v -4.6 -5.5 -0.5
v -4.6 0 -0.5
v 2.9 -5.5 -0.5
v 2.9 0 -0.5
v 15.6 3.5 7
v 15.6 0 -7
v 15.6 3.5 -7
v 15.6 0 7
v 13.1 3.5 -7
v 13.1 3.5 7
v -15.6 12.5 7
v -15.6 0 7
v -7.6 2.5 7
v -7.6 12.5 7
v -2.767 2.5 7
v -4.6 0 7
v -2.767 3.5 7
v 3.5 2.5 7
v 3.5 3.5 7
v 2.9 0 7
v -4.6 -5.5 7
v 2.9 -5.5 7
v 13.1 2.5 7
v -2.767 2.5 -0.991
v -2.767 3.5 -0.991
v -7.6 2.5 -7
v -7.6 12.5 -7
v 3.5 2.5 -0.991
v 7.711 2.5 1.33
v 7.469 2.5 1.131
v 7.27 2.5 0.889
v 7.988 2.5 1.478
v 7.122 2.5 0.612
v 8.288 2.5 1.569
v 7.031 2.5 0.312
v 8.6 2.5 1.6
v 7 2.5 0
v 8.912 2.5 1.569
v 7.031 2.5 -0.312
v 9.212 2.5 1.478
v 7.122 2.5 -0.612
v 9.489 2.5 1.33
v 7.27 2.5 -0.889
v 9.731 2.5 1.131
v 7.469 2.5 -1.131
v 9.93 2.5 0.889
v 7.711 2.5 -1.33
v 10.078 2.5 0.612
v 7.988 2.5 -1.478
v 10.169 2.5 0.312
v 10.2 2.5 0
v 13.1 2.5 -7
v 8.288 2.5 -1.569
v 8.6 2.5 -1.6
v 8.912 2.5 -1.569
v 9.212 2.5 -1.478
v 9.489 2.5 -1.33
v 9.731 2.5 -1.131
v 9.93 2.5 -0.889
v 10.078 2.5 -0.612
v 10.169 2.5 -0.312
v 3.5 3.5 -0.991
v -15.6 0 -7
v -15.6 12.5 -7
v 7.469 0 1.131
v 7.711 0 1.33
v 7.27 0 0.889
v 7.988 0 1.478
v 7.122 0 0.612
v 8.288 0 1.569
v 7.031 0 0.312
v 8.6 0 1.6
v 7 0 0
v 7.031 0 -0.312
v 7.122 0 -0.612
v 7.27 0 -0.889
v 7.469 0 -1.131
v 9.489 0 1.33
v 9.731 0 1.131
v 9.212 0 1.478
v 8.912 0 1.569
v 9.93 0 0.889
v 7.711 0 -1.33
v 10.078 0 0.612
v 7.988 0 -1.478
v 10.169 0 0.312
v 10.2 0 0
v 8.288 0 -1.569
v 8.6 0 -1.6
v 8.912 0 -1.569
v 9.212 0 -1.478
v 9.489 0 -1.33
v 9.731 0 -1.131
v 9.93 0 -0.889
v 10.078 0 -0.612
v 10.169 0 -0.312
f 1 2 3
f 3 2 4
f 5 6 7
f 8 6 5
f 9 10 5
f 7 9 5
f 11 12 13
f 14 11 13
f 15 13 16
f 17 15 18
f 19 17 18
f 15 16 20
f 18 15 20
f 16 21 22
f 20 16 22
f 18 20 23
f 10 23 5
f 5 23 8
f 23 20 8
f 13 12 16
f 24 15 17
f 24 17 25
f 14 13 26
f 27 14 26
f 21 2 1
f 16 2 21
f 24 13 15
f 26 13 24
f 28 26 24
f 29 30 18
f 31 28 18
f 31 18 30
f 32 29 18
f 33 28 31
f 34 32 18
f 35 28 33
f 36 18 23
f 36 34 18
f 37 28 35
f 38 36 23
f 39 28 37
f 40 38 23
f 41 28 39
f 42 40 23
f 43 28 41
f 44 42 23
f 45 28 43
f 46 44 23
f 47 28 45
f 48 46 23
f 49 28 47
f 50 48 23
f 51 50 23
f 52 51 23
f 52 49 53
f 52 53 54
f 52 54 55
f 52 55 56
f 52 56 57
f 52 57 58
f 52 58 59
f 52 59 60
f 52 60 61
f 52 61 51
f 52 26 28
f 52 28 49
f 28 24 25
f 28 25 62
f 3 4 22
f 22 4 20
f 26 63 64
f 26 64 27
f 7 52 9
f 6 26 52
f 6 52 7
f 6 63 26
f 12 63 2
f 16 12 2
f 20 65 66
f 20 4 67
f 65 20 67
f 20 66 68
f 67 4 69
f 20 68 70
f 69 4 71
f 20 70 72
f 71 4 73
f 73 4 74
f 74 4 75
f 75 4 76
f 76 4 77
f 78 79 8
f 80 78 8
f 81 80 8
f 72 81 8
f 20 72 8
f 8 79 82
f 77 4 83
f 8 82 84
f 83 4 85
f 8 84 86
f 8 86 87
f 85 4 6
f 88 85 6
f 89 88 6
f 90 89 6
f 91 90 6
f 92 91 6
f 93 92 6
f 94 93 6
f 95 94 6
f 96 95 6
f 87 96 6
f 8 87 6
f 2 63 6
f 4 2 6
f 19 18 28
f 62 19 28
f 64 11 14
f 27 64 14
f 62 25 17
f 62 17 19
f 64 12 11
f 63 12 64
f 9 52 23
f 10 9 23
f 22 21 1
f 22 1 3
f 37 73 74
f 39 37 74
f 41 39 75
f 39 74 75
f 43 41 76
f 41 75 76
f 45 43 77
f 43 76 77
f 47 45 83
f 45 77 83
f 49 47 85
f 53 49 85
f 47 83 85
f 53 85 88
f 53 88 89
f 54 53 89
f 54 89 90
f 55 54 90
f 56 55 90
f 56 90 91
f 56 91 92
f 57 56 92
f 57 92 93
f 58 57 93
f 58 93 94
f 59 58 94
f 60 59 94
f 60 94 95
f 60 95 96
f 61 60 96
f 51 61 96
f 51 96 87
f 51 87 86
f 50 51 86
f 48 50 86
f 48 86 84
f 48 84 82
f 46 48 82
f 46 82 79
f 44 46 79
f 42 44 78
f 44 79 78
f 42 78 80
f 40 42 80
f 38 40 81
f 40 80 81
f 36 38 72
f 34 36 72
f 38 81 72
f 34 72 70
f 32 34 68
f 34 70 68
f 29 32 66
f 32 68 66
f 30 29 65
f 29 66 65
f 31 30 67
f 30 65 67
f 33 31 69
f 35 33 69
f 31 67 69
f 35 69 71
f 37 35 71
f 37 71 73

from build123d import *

# Parameters (mm, degrees)
SKETCH_1_W         = 31.2
SKETCH_1_H         = 14
EXTRUDE_1_DEPTH    = 2.5
SKETCH_2_W         = 8
SKETCH_2_H         = 14
EXTRUDE_2_DEPTH    = 10
SKETCH_3_W         = 7.5
SKETCH_3_H         = 7.5
EXTRUDE_3_DEPTH    = 5.5
HOLE_WIZARD_M3_1_D = 3.2
SKETCH_9_W         = 6.266652583
SKETCH_9_H         = 7.99110138
EXTRUDE_7_DEPTH    = 1
SKETCH_10_W        = 2.5
SKETCH_10_H        = 14
EXTRUDE_8_DEPTH    = 1


with BuildPart() as part:
    # 草图1 → 凸台-拉伸1 (new body)
    with BuildSketch(Plane(origin=(0, 0, 0), x_dir=(1, 0, 0), z_dir=(0, 1, 0))):
        Rectangle(SKETCH_1_W, SKETCH_1_H)
    extrude(amount=EXTRUDE_1_DEPTH)

    # 草图2 → 凸台-拉伸2 (add)
    with BuildSketch(Plane(origin=(0, 2.5, 0), x_dir=(1, 0, 0), z_dir=(0, 1, 0))):
        with Locations((-11.6, 0)):
            Rectangle(SKETCH_2_W, SKETCH_2_H)
    extrude(amount=EXTRUDE_2_DEPTH)

    # 草图3 → 凸台-拉伸3 (add)
    with BuildSketch(Plane.XZ):
        with Locations((-0.85, 3.25)):
            Rectangle(SKETCH_3_W, SKETCH_3_H)
    extrude(amount=EXTRUDE_3_DEPTH)

    # M3 间隙孔1 (through all)
    with Locations(Plane(origin=(0, 2.5, 0), x_dir=(1, 0, 0), z_dir=(0, 1, 0))):
        with Locations((8.6, 0)):
            Hole(HOLE_WIZARD_M3_1_D / 2)

    # 草图9 → 凸台-拉伸7 (add)
    with BuildSketch(Plane(origin=(0, 2.5, 0), x_dir=(1, 0, 0), z_dir=(0, 1, 0))):
        with Locations((0.366673708, -3.00444931)):
            Rectangle(SKETCH_9_W, SKETCH_9_H)
    extrude(amount=EXTRUDE_7_DEPTH)

    # 草图10 → 凸台-拉伸8 (add)
    with BuildSketch(Plane.XZ.offset(-2.5)):
        with Locations((14.35, 0)):
            Rectangle(SKETCH_10_W, SKETCH_10_H)
    extrude(amount=-EXTRUDE_8_DEPTH)


solid = part.part
